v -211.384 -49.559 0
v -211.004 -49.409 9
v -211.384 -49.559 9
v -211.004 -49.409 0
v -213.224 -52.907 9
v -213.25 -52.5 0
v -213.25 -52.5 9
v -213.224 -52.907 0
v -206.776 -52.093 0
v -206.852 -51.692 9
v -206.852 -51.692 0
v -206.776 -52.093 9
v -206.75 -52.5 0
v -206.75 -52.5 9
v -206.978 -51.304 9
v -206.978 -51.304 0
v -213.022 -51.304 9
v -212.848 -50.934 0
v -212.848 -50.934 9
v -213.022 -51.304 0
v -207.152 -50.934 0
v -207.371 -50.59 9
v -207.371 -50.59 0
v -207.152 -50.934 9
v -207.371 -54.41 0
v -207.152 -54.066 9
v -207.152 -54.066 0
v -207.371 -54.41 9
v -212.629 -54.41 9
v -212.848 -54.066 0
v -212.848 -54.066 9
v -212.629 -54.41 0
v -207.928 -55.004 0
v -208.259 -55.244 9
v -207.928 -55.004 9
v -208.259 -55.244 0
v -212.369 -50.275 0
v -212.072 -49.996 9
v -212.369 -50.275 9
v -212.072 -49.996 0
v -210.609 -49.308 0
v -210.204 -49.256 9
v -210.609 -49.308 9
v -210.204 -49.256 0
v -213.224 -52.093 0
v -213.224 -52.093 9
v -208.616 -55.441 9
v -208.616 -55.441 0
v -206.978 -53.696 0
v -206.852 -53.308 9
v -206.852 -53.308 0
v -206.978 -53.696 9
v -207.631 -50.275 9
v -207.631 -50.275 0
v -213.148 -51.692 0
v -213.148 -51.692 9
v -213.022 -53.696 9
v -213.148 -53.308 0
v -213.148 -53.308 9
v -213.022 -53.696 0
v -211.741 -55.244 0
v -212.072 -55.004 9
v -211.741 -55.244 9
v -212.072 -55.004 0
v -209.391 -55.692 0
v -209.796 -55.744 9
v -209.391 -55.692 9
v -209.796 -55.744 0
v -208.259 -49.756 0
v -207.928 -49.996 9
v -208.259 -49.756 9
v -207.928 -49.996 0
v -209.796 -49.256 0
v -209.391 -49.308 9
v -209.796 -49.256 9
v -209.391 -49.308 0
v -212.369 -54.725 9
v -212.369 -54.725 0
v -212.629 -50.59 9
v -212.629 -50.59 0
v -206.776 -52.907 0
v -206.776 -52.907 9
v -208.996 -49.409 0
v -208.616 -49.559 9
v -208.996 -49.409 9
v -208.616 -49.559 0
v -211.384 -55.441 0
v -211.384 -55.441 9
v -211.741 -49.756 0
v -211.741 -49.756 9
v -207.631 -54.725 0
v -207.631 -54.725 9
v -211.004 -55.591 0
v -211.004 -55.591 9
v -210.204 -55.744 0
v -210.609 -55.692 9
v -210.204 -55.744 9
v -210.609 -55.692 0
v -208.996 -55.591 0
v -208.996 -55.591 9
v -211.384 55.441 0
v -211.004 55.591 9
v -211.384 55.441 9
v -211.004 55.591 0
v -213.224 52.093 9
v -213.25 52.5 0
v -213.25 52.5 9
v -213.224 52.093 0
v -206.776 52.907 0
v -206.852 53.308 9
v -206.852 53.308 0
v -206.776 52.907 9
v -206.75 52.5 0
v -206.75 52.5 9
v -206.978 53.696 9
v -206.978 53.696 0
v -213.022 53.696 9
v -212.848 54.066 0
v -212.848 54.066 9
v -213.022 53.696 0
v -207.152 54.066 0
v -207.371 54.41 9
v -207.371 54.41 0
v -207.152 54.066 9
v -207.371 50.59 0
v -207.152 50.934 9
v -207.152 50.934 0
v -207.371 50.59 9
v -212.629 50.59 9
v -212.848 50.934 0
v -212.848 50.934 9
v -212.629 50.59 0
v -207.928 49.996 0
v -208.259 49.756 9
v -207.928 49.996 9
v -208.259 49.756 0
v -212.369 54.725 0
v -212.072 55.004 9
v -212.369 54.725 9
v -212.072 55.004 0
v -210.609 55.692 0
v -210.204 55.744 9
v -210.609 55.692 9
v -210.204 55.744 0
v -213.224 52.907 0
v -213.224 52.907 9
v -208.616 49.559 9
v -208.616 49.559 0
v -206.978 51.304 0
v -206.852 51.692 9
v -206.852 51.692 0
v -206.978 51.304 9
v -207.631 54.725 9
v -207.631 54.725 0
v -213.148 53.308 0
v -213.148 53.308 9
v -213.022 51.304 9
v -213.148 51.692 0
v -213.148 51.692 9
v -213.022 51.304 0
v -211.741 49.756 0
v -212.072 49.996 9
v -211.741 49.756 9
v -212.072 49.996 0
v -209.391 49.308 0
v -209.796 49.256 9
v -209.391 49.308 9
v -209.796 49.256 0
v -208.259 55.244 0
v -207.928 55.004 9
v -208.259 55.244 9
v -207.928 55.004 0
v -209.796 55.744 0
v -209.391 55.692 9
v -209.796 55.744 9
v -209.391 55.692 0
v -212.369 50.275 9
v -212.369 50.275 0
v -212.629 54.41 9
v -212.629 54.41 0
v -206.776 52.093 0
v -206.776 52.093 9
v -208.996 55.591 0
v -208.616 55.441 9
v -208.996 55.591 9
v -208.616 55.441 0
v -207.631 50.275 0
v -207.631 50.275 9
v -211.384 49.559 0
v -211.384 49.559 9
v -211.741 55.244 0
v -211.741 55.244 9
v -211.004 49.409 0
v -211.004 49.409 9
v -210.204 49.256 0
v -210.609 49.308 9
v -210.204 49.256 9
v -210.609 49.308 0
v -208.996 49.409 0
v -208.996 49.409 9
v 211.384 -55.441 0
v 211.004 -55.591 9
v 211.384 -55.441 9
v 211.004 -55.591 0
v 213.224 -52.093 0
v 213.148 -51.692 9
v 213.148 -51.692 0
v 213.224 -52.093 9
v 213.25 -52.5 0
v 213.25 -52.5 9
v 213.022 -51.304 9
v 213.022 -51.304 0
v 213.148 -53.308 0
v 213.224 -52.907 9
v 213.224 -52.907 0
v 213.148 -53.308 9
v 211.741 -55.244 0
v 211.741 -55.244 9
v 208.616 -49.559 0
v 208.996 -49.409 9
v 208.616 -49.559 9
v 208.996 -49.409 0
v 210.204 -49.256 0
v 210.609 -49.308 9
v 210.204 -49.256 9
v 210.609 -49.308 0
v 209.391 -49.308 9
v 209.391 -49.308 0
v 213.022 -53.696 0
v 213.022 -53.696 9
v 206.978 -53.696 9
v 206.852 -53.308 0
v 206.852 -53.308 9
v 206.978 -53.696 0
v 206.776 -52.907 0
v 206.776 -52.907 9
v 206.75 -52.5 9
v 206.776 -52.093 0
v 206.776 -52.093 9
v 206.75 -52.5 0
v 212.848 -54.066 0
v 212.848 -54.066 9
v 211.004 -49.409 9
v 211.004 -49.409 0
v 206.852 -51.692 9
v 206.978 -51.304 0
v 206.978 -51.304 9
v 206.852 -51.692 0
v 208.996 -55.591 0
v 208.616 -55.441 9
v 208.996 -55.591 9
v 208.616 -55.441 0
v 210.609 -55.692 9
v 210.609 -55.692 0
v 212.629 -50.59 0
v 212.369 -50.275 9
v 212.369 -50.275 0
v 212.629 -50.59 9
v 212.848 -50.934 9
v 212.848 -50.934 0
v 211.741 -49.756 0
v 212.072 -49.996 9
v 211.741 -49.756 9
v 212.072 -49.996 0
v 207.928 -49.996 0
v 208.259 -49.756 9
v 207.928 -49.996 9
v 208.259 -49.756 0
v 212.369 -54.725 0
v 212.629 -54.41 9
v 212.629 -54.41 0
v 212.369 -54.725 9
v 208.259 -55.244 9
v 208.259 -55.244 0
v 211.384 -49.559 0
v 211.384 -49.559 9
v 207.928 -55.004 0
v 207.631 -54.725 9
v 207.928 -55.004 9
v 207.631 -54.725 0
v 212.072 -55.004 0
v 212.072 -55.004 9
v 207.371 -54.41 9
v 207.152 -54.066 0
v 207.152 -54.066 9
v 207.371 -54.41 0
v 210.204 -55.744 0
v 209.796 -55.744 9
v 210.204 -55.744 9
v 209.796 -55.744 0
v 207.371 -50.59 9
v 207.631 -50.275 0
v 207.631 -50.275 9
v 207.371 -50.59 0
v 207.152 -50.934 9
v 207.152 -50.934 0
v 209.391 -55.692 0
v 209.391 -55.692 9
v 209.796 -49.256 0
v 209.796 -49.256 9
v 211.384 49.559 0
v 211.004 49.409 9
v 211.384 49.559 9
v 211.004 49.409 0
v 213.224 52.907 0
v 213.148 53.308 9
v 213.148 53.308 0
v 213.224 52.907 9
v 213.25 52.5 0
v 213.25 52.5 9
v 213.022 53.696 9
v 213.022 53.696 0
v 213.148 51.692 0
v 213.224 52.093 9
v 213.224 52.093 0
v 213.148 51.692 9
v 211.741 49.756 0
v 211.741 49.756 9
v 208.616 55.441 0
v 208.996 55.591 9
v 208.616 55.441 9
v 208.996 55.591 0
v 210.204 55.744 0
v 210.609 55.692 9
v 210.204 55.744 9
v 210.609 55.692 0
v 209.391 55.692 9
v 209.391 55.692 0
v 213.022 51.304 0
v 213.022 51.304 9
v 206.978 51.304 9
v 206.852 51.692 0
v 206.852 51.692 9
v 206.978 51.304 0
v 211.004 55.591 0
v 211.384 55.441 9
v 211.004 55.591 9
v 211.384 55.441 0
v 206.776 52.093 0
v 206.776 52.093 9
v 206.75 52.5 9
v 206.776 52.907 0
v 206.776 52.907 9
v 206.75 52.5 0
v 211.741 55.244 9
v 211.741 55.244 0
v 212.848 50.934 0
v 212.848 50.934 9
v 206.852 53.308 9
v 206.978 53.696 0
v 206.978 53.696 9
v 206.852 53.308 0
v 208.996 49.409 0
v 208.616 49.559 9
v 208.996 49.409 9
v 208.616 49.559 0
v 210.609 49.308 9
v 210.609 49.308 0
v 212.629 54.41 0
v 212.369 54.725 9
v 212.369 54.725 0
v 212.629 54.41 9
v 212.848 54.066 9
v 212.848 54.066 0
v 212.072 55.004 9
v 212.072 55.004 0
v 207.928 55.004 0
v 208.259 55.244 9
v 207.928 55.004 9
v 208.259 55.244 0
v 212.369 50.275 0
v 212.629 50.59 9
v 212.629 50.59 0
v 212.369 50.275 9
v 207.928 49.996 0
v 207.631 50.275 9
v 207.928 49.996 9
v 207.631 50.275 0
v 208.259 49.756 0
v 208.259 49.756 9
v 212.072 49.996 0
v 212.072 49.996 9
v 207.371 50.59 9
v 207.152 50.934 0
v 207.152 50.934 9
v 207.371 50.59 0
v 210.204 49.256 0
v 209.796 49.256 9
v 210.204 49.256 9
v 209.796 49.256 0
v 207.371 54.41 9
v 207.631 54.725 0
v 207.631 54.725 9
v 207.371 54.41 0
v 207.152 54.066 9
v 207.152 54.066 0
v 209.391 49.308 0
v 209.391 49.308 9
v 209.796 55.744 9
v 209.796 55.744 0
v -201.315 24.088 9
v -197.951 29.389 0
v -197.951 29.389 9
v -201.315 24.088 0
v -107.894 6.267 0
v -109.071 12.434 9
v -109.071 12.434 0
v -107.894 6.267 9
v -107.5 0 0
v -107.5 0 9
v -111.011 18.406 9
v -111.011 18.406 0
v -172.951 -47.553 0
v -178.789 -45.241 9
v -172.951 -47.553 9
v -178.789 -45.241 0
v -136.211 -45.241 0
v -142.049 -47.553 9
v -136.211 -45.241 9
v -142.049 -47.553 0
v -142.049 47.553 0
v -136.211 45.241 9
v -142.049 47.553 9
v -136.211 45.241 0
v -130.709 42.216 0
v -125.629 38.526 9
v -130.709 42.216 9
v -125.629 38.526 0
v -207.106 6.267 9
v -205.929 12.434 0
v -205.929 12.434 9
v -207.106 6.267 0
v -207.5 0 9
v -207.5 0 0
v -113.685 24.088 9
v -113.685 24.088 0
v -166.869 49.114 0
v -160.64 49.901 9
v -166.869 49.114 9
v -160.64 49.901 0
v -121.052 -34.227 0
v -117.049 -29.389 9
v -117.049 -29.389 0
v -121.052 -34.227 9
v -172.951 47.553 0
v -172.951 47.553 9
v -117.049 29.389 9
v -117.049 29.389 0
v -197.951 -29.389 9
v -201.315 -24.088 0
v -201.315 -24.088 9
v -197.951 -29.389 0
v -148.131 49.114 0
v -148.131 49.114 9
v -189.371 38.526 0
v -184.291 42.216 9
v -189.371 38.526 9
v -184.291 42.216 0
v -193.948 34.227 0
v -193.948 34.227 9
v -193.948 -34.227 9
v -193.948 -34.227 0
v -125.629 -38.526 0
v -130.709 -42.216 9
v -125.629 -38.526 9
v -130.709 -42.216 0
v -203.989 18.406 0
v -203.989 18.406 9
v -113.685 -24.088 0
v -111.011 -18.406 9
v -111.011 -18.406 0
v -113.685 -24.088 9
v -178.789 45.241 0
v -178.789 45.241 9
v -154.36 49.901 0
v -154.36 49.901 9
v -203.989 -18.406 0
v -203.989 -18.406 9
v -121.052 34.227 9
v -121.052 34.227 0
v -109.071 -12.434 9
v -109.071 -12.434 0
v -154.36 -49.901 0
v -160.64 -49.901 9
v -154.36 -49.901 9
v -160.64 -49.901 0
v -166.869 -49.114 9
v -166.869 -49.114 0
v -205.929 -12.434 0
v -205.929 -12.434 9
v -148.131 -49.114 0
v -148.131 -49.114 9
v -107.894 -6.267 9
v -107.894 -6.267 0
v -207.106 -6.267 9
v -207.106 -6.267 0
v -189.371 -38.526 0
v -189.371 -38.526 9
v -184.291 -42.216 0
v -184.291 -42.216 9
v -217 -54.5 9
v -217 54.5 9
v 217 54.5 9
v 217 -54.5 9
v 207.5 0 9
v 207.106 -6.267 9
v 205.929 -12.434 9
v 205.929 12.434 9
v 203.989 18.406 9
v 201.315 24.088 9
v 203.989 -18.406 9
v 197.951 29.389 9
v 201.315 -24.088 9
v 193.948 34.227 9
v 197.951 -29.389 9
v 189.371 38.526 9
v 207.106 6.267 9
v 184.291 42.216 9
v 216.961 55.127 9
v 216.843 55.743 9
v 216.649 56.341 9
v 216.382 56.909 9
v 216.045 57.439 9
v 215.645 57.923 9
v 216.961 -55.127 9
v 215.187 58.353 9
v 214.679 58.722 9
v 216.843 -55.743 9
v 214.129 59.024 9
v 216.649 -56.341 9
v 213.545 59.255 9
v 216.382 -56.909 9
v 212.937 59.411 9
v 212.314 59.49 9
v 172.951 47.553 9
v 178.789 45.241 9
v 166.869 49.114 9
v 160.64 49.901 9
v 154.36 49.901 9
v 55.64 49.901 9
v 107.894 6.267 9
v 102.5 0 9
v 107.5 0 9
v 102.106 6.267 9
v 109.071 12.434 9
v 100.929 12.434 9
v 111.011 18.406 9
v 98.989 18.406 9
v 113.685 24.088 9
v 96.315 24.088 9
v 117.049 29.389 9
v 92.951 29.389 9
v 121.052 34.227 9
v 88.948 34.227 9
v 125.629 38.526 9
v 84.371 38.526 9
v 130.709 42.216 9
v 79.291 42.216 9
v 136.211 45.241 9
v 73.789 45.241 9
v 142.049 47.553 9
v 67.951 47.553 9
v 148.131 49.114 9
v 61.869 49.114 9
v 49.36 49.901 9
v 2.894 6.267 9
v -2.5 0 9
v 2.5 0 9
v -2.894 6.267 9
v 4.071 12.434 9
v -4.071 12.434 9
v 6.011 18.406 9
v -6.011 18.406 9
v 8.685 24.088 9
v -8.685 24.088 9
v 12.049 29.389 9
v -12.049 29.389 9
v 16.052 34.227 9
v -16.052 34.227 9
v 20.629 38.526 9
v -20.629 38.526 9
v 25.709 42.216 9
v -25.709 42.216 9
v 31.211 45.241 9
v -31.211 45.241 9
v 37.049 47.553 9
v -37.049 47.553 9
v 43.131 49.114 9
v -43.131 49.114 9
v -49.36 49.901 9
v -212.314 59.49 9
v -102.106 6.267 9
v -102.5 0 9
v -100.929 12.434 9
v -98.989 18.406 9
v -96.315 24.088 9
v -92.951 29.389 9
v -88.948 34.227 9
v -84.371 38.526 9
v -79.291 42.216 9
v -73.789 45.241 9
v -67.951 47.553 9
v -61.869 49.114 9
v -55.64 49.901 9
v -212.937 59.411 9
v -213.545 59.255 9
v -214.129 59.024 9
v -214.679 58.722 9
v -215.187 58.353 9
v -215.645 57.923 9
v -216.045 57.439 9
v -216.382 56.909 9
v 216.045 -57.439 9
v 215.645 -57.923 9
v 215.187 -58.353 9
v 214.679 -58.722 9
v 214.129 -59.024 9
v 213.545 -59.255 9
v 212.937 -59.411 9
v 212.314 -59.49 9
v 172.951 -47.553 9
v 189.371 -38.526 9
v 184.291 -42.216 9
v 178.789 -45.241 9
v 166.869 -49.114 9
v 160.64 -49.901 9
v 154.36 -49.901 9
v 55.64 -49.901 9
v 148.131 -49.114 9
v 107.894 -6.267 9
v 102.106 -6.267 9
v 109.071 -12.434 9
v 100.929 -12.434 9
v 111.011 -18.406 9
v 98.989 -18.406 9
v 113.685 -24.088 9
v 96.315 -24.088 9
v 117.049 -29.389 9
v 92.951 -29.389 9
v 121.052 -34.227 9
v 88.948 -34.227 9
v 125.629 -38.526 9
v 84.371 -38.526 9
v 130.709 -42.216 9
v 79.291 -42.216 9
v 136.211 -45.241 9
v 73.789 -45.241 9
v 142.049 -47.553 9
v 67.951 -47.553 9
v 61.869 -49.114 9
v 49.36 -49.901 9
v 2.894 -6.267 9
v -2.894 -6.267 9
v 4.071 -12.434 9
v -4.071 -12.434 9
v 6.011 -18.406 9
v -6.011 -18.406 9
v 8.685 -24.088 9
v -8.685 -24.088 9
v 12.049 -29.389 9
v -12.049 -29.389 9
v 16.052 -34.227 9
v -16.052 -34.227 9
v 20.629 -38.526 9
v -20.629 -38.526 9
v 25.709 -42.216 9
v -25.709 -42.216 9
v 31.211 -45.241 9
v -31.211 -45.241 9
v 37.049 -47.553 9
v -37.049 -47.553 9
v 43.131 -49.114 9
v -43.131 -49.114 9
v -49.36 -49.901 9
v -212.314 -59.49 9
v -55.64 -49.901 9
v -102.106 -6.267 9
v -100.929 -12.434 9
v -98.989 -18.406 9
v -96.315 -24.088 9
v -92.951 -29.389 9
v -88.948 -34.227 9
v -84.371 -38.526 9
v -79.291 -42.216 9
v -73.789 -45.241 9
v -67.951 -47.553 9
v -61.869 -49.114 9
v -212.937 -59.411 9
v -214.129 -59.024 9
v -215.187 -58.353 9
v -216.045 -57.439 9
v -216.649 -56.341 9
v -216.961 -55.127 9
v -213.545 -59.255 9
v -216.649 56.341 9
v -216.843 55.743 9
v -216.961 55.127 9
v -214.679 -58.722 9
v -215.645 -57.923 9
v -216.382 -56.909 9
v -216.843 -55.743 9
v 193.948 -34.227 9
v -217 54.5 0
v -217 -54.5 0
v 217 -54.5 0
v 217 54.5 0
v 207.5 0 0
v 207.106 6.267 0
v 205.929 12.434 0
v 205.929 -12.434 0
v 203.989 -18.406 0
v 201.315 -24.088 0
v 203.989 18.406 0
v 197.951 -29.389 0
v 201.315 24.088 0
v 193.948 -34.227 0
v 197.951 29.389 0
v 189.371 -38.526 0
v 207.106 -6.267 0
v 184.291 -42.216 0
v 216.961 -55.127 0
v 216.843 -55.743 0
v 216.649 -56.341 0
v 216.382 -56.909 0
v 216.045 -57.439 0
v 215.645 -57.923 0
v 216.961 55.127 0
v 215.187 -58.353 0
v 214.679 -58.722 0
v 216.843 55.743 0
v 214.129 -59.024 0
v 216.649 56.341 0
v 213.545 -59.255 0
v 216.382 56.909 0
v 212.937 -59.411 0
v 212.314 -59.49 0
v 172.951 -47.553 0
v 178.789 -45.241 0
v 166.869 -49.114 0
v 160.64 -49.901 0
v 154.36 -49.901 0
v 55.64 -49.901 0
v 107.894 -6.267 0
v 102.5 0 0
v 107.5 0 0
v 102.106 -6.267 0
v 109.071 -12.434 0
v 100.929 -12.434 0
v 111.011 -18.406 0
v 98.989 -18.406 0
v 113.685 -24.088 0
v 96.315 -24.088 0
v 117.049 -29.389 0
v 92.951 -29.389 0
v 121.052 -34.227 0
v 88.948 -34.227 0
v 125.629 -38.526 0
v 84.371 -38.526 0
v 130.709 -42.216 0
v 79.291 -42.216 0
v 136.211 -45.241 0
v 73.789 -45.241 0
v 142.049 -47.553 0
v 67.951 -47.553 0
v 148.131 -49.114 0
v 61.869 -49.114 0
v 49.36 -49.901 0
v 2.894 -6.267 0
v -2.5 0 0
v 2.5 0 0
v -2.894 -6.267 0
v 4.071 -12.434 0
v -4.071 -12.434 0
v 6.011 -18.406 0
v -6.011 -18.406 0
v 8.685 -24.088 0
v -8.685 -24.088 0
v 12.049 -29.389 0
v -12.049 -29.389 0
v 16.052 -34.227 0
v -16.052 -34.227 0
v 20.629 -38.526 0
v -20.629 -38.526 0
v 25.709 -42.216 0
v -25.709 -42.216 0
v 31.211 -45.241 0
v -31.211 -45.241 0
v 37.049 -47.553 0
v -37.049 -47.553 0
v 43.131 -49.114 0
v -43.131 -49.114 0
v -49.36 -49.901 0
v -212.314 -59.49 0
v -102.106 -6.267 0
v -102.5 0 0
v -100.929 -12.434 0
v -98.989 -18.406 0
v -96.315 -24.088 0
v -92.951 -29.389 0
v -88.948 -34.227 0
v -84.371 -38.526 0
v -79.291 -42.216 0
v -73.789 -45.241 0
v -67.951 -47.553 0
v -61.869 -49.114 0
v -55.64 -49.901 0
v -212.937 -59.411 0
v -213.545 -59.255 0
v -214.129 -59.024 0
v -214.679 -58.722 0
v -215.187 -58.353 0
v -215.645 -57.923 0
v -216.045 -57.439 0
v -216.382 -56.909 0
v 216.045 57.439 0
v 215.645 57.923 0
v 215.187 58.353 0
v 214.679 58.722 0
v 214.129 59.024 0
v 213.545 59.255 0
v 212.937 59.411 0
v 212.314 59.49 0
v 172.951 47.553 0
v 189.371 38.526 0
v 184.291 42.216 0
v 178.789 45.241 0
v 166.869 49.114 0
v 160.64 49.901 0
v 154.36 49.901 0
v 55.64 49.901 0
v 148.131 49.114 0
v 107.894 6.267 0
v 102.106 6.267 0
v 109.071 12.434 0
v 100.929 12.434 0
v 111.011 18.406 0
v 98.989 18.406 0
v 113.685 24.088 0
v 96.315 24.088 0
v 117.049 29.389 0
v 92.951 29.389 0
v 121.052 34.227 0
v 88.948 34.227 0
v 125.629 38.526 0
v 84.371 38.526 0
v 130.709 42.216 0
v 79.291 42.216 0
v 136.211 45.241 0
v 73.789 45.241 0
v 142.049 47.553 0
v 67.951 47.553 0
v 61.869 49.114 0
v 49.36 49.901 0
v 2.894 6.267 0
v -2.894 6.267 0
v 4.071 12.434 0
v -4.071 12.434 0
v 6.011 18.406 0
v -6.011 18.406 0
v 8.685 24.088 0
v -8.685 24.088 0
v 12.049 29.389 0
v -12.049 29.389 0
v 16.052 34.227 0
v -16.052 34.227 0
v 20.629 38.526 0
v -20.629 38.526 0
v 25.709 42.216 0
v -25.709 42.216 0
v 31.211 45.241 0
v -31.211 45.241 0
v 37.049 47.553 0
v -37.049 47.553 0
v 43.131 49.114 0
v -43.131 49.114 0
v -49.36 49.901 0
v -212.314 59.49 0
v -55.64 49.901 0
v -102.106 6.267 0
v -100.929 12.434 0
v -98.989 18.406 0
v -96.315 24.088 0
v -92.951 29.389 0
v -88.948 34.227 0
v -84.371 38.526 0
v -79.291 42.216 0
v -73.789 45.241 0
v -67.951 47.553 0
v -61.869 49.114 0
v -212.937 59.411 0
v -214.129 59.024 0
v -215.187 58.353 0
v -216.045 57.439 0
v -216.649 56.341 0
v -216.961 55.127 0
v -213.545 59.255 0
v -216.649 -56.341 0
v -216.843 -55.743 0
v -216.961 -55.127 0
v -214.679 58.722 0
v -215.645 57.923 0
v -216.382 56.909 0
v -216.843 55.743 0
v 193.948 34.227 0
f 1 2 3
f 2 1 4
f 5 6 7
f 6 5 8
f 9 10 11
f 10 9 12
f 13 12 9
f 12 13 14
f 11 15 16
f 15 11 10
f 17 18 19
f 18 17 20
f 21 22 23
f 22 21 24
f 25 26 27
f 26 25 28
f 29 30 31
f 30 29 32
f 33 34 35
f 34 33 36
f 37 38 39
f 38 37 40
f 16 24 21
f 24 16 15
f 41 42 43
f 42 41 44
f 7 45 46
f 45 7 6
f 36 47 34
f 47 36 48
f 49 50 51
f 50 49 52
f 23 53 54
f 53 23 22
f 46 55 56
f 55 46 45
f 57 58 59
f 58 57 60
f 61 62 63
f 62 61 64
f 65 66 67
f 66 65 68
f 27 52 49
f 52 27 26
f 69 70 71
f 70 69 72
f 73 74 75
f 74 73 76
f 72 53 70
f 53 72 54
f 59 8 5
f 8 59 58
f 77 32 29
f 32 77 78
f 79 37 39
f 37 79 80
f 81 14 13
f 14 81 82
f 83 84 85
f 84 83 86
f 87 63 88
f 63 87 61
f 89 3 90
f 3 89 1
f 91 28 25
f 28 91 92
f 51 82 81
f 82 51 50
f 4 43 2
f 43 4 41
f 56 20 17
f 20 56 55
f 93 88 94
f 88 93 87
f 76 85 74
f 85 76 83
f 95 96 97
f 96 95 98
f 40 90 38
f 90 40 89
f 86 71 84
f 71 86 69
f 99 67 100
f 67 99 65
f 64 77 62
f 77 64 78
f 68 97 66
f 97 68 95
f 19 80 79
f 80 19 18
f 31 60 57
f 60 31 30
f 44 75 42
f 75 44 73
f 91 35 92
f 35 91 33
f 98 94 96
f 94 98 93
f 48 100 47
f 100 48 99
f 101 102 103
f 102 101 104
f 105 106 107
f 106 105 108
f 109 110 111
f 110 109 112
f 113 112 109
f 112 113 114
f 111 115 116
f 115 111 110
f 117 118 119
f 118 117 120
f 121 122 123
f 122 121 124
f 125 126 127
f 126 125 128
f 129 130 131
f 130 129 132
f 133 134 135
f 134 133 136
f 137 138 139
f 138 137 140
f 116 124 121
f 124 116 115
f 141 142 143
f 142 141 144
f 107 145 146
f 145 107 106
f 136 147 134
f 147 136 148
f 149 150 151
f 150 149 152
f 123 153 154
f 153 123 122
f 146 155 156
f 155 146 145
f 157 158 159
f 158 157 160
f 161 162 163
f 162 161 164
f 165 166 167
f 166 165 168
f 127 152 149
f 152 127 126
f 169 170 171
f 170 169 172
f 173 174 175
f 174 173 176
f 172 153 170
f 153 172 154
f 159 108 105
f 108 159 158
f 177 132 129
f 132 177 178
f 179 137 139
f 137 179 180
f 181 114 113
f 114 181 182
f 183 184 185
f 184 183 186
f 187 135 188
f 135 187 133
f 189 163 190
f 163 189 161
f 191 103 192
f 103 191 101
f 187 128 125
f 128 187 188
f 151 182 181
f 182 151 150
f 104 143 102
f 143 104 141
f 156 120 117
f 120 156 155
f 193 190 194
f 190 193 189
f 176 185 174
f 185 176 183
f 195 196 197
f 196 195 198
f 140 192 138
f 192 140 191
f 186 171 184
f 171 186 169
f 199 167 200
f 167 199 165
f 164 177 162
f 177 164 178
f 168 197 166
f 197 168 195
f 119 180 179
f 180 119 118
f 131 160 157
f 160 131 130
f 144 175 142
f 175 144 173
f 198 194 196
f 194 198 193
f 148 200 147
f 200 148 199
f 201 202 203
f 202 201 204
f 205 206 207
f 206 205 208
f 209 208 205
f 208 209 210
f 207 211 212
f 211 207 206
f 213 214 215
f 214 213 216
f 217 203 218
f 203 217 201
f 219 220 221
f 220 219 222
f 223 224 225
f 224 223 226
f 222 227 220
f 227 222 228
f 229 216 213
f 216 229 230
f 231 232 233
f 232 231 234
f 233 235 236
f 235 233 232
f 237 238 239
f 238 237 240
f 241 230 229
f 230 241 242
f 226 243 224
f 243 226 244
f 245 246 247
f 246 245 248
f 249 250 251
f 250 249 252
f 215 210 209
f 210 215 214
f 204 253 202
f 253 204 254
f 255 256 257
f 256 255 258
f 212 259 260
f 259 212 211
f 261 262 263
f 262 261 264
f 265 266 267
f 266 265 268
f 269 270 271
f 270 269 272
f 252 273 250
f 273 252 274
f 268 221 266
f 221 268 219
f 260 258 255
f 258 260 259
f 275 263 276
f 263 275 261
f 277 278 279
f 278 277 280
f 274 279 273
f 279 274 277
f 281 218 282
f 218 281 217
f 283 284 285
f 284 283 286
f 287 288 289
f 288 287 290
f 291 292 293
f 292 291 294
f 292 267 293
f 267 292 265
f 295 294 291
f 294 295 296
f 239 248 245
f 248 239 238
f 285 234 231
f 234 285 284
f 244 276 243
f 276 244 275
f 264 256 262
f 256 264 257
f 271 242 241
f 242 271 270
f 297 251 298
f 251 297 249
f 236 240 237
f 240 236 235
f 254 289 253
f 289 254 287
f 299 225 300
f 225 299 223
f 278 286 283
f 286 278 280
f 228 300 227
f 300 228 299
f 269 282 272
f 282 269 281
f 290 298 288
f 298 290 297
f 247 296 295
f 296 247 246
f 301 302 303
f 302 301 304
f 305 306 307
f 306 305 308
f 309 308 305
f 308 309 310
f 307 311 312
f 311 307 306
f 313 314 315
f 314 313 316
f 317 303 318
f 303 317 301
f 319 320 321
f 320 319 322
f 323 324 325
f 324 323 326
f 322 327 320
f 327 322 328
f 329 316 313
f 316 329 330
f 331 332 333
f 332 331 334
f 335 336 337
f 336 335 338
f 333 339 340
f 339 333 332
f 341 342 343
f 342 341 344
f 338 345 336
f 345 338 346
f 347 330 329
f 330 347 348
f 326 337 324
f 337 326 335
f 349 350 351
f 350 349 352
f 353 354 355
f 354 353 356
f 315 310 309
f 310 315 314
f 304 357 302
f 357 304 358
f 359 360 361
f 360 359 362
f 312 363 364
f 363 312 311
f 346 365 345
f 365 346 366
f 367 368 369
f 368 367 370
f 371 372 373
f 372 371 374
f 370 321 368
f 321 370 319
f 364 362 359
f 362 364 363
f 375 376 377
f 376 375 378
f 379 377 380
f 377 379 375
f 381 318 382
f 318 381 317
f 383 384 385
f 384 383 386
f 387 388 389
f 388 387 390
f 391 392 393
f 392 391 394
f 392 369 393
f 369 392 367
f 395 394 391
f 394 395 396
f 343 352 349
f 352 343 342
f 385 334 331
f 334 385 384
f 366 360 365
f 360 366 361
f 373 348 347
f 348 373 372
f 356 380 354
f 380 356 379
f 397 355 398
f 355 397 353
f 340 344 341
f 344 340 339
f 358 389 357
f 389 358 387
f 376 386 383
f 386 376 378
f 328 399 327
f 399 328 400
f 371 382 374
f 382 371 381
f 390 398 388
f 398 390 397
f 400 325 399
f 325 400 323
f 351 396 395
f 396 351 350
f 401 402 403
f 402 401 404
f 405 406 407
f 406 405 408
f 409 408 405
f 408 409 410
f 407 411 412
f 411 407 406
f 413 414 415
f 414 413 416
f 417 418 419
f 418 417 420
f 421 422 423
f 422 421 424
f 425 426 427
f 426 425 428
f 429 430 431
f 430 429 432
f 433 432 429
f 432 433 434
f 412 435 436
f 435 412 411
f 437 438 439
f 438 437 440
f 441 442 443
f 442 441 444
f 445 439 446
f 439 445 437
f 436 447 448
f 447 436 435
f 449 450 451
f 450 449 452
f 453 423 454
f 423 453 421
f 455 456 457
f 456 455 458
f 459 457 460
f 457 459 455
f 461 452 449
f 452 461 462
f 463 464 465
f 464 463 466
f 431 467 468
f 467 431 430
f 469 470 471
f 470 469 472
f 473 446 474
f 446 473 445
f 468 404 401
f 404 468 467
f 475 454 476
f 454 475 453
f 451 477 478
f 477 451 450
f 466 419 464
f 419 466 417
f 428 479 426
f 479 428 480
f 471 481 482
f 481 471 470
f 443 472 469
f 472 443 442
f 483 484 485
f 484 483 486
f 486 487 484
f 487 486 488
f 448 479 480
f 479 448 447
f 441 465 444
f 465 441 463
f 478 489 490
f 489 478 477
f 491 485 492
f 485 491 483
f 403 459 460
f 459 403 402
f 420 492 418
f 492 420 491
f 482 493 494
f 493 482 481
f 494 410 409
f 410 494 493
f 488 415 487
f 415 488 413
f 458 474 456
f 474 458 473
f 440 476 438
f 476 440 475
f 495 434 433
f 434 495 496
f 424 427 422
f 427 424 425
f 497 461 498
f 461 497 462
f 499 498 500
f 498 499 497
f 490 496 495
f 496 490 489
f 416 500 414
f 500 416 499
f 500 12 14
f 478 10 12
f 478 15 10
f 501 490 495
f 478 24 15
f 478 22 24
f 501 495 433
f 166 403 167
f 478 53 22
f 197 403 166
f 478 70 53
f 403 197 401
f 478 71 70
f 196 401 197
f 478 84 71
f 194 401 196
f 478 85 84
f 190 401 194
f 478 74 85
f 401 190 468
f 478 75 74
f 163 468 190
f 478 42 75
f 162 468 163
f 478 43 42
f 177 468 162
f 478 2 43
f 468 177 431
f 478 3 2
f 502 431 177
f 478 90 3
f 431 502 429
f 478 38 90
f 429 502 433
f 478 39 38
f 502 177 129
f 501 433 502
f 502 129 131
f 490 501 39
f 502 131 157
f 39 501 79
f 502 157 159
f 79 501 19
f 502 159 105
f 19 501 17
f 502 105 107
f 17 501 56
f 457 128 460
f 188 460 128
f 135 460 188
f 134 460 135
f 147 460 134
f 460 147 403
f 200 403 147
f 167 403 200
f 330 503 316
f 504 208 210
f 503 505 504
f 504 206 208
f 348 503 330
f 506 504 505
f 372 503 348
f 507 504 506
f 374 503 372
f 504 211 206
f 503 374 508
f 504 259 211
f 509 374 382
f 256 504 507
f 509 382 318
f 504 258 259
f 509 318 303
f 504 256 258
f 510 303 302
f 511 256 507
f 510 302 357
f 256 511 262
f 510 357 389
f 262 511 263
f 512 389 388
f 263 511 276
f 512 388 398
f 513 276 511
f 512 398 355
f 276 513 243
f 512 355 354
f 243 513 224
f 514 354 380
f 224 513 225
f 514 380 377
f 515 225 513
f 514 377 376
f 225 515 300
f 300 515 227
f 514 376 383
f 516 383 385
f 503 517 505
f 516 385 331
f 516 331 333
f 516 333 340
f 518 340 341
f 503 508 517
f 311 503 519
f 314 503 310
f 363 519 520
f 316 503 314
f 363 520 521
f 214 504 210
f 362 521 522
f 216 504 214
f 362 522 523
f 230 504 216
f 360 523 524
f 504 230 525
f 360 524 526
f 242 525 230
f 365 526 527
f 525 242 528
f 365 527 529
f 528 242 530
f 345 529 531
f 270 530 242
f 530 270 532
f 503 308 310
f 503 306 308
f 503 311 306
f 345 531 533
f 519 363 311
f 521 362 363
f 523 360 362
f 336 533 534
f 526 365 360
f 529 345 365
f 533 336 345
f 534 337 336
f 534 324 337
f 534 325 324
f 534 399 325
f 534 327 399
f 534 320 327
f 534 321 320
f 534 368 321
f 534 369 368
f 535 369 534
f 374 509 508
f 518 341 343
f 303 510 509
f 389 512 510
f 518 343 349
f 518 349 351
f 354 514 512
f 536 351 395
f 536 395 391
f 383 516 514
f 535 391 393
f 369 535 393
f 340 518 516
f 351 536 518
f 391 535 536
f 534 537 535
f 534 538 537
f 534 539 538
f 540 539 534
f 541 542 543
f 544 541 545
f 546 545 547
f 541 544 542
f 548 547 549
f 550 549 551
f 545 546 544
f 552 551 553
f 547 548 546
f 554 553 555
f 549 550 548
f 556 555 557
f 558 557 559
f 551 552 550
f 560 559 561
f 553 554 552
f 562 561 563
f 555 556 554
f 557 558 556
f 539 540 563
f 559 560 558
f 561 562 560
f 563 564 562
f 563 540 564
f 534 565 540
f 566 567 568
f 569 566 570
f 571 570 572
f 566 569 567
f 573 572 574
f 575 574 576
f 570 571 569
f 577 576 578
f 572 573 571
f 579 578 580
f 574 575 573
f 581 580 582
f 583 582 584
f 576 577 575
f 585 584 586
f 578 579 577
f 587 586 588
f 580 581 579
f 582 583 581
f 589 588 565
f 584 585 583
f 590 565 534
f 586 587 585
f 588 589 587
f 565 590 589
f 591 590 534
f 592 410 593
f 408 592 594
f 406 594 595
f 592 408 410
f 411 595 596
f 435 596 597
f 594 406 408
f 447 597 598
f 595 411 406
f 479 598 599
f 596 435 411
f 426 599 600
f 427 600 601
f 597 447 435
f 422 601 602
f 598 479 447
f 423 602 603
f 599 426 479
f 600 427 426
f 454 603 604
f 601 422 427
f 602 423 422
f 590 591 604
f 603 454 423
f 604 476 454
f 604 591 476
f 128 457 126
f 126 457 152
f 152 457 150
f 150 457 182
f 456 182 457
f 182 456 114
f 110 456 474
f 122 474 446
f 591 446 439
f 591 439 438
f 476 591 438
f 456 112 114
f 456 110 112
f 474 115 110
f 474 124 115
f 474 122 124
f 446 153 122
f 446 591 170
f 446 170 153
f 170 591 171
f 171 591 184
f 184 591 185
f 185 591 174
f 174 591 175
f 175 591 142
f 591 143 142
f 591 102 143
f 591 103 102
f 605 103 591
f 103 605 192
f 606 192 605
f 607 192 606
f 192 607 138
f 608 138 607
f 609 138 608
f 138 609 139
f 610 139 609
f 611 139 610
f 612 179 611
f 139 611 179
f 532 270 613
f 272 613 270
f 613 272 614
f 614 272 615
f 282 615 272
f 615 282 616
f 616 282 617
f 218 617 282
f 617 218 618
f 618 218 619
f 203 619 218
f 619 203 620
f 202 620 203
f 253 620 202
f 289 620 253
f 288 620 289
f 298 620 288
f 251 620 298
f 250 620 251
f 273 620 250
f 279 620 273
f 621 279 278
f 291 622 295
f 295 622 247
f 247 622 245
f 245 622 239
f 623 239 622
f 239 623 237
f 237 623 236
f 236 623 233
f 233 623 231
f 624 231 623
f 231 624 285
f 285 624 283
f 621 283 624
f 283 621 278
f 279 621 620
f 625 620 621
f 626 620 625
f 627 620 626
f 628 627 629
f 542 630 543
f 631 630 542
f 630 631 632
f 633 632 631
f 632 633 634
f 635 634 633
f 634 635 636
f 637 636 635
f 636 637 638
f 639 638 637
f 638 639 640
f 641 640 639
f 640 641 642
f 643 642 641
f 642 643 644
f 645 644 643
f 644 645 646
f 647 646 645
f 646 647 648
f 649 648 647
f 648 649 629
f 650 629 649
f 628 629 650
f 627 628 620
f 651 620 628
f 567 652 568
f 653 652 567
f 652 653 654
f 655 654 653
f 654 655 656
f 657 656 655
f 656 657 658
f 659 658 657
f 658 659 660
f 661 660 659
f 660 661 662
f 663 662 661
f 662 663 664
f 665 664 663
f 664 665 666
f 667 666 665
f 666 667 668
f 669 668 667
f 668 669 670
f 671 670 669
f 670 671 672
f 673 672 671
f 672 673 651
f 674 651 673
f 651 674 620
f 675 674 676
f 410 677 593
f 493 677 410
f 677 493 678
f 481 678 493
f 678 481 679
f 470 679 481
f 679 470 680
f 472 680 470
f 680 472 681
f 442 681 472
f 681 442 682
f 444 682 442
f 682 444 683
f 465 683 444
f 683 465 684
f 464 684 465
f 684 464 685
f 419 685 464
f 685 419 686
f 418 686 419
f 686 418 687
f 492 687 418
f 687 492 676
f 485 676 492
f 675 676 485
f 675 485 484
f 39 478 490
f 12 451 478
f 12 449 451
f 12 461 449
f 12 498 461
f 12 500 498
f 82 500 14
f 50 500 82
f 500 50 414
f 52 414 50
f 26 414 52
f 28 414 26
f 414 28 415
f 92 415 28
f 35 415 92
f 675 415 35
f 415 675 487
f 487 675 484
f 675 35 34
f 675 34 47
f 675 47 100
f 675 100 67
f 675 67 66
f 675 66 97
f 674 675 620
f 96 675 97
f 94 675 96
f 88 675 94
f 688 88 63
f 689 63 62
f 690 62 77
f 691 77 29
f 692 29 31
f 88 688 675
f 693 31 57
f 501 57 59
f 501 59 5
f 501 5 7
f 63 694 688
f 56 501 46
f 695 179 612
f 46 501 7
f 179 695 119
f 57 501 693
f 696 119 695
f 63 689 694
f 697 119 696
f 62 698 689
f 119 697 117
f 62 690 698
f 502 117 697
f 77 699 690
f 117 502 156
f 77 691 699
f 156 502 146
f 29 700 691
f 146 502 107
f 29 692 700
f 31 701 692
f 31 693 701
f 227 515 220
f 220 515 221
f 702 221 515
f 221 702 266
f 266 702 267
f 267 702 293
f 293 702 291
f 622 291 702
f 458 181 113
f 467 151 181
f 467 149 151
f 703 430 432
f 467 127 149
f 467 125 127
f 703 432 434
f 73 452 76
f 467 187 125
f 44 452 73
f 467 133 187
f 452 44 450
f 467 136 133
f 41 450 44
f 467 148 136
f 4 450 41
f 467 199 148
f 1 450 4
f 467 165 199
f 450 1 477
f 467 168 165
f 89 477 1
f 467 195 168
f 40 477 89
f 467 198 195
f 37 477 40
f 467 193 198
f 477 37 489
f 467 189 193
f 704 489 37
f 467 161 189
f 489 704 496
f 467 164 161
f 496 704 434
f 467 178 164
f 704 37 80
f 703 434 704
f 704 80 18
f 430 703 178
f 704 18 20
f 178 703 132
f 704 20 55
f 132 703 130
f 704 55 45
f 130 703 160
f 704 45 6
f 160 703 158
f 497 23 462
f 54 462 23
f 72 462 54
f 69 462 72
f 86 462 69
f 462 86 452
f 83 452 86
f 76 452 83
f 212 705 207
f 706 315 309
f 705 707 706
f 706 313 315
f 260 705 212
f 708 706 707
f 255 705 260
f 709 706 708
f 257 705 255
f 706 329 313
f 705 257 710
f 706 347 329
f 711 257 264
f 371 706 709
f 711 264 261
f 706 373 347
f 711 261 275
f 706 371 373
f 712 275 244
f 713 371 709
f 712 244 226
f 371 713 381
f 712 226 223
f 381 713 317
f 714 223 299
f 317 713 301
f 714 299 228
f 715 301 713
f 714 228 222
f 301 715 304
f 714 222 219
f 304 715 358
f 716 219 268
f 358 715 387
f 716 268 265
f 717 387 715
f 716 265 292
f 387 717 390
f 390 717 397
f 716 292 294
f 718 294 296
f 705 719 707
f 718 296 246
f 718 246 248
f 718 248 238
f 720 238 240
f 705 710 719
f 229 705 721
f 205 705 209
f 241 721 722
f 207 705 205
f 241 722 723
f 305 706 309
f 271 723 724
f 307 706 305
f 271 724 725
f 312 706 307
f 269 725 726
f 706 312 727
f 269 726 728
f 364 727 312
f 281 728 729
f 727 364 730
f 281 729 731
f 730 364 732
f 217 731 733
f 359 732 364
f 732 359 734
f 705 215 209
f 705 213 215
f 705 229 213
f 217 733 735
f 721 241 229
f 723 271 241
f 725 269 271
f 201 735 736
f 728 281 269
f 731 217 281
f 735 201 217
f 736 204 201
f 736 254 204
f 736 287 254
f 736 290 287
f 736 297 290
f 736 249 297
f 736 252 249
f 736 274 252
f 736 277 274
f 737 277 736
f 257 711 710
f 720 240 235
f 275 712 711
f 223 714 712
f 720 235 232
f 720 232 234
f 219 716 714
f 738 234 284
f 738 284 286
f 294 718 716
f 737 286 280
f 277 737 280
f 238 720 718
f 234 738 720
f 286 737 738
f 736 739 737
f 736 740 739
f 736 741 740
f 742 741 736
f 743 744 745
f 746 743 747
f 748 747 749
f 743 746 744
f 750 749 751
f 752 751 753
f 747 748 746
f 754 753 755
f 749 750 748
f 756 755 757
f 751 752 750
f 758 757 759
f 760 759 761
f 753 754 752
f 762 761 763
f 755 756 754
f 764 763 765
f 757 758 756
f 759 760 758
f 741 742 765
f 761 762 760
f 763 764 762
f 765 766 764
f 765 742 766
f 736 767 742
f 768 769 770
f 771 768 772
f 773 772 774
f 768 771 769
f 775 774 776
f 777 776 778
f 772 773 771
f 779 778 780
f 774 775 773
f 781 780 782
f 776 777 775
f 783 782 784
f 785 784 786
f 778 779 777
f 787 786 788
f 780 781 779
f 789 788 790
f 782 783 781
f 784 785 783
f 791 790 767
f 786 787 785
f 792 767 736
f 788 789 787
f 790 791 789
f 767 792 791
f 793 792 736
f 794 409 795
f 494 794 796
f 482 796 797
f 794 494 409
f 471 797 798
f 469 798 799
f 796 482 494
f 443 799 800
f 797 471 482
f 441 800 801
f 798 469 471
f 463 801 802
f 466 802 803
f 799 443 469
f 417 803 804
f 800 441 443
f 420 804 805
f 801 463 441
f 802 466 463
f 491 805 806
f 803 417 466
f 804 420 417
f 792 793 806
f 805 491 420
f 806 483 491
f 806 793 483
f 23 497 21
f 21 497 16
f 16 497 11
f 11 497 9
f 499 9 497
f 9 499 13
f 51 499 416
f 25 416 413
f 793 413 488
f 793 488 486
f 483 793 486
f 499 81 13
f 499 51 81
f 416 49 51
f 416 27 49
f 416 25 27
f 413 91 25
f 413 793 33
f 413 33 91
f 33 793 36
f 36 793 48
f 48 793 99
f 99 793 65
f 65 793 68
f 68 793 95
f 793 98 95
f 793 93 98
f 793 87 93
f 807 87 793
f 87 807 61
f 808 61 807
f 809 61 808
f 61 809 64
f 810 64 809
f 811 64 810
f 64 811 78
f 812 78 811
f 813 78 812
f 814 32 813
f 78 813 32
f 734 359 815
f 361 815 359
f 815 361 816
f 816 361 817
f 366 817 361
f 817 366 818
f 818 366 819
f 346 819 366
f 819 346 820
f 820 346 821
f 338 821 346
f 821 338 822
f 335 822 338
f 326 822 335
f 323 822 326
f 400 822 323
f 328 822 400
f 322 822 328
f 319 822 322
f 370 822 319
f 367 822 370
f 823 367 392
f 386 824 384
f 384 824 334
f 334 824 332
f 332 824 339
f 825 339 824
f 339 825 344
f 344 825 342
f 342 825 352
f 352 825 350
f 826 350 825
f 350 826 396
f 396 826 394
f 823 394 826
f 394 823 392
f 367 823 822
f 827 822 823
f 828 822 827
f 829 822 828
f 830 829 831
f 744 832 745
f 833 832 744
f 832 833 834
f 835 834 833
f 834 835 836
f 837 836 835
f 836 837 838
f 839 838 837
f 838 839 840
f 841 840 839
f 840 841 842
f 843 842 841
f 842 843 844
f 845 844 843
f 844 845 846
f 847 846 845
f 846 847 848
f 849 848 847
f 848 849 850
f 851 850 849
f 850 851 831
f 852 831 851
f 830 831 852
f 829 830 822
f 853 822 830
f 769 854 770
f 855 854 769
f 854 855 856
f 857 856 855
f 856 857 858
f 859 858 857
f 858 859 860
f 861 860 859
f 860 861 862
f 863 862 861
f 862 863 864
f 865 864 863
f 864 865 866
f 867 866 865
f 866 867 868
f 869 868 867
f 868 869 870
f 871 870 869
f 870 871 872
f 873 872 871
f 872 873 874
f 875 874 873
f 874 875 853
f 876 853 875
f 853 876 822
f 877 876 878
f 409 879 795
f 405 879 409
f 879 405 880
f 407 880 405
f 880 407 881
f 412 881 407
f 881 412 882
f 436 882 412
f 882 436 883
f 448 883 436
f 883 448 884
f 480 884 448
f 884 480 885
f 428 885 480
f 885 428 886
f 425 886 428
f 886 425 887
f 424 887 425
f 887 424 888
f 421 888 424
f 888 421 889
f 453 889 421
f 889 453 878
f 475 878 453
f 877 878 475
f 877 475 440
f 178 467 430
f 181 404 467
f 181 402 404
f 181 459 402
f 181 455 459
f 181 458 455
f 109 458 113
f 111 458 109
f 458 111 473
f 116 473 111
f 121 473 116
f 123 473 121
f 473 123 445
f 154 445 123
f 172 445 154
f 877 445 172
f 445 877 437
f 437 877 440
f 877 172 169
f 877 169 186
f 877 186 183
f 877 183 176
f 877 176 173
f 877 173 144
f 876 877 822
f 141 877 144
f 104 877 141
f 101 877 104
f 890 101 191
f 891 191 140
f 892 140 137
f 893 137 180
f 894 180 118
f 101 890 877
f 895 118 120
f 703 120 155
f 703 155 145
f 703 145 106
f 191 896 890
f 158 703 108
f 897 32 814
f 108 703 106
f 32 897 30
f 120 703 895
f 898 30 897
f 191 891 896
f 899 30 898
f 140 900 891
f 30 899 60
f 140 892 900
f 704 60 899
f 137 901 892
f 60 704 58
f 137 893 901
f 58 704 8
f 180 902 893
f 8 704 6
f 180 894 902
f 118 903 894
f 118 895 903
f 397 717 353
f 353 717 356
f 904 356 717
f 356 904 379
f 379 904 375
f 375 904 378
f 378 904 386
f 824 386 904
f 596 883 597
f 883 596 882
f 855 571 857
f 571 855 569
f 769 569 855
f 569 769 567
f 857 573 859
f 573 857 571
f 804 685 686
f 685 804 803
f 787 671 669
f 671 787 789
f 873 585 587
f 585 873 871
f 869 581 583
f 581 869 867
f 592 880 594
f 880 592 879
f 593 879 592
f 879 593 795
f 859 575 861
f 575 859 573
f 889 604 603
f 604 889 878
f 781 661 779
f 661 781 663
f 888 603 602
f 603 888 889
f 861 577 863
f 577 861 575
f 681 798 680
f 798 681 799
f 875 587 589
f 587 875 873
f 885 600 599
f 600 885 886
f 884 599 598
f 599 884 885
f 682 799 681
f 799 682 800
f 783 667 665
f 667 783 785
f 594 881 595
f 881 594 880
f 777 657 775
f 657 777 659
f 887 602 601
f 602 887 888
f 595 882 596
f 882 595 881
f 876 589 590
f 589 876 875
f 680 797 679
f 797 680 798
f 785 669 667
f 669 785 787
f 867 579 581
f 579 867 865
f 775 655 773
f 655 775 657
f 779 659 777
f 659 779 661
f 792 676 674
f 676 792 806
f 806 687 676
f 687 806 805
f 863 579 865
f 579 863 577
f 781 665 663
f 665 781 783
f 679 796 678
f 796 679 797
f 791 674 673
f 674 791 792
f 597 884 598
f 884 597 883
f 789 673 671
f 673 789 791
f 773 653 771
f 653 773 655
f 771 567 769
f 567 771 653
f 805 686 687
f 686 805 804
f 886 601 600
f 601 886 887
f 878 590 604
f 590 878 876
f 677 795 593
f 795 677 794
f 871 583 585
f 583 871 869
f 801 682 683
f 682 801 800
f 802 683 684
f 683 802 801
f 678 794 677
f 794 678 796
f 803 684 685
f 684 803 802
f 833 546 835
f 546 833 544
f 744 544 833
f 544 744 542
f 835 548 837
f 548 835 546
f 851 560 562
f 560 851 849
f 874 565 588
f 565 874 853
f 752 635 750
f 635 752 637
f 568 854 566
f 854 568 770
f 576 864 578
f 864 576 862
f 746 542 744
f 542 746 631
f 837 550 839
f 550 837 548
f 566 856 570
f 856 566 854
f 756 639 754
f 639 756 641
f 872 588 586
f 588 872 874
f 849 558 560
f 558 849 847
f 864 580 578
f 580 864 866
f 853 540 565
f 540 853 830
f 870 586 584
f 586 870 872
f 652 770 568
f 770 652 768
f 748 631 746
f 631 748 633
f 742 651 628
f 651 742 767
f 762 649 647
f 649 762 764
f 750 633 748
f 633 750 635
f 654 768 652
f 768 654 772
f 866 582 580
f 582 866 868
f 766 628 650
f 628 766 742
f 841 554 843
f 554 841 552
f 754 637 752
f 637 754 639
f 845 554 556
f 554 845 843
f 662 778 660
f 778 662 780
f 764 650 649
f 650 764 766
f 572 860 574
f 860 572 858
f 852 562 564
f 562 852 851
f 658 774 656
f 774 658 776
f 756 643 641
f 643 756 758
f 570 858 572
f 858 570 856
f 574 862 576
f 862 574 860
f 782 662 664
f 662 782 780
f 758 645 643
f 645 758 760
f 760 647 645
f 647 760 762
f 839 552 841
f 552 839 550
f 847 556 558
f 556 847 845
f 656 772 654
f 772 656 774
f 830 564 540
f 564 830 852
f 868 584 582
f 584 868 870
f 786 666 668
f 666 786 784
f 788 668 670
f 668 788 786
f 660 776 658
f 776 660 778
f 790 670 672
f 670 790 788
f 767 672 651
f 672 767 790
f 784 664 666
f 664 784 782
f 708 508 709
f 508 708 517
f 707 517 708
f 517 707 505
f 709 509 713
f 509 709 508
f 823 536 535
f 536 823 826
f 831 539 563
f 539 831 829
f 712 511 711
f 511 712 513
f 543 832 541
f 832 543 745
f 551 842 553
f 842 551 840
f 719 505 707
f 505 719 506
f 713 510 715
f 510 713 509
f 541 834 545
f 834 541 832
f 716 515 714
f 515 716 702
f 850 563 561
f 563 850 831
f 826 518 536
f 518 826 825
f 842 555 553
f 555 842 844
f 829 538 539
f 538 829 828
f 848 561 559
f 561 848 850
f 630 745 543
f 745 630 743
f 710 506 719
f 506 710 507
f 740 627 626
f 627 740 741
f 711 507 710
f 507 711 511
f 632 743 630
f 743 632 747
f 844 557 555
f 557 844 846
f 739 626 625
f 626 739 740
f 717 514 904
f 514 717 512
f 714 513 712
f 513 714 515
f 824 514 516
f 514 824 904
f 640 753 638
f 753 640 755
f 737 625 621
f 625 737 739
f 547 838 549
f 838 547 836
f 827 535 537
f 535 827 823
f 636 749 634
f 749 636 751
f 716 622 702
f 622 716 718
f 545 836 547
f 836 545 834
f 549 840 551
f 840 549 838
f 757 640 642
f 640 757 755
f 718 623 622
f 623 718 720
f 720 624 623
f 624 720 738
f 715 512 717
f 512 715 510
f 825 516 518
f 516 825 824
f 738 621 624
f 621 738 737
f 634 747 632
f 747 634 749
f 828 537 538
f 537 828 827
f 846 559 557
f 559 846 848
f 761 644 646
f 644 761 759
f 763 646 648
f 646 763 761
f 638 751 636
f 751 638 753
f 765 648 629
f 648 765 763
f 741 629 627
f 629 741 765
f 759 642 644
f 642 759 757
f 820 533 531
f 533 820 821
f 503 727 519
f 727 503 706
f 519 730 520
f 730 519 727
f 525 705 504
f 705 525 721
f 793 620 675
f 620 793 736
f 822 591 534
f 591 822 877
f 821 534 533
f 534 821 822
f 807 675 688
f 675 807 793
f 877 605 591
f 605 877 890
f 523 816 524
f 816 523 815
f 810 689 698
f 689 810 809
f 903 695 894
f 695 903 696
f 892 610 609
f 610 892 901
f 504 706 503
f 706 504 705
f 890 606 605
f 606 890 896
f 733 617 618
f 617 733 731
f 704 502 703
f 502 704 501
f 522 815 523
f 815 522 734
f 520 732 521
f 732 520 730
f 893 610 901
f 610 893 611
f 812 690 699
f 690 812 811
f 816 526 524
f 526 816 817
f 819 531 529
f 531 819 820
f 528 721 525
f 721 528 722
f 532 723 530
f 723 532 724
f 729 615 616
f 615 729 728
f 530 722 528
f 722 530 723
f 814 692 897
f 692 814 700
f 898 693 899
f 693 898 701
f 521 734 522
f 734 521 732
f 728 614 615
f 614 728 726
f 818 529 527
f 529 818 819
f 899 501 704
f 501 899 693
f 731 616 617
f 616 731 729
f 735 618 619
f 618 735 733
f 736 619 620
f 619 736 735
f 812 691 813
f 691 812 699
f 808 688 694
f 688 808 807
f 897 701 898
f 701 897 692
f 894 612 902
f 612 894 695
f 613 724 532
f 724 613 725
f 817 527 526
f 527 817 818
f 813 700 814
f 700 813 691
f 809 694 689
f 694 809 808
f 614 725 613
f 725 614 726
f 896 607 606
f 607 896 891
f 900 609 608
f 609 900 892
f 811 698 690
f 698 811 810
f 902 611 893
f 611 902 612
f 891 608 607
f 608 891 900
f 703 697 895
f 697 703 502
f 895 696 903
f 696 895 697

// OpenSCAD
$fn = 50;


difference() {
	union() {
		hull() {
			translate(v = [-212.0000000000, 54.5000000000, 0]) {
				cylinder(h = 9, r = 5);
			}
			translate(v = [212.0000000000, 54.5000000000, 0]) {
				cylinder(h = 9, r = 5);
			}
			translate(v = [-212.0000000000, -54.5000000000, 0]) {
				cylinder(h = 9, r = 5);
			}
			translate(v = [212.0000000000, -54.5000000000, 0]) {
				cylinder(h = 9, r = 5);
			}
		}
	}
	union() {
		#translate(v = [-210.0000000000, -52.5000000000, -100.0000000000]) {
			cylinder(h = 200, r = 3.2500000000);
		}
		#translate(v = [-210.0000000000, 52.5000000000, -100.0000000000]) {
			cylinder(h = 200, r = 3.2500000000);
		}
		#translate(v = [210.0000000000, -52.5000000000, -100.0000000000]) {
			cylinder(h = 200, r = 3.2500000000);
		}
		#translate(v = [210.0000000000, 52.5000000000, -100.0000000000]) {
			cylinder(h = 200, r = 3.2500000000);
		}
		#translate(v = [-157.5000000000, 0, 0]) {
			cylinder(h = 9, r = 50.0000000000);
		}
		#translate(v = [-52.5000000000, 0, 0]) {
			cylinder(h = 9, r = 50.0000000000);
		}
		#translate(v = [52.5000000000, 0, 0]) {
			cylinder(h = 9, r = 50.0000000000);
		}
		#translate(v = [157.5000000000, 0, 0]) {
			cylinder(h = 9, r = 50.0000000000);
		}
	}
}
